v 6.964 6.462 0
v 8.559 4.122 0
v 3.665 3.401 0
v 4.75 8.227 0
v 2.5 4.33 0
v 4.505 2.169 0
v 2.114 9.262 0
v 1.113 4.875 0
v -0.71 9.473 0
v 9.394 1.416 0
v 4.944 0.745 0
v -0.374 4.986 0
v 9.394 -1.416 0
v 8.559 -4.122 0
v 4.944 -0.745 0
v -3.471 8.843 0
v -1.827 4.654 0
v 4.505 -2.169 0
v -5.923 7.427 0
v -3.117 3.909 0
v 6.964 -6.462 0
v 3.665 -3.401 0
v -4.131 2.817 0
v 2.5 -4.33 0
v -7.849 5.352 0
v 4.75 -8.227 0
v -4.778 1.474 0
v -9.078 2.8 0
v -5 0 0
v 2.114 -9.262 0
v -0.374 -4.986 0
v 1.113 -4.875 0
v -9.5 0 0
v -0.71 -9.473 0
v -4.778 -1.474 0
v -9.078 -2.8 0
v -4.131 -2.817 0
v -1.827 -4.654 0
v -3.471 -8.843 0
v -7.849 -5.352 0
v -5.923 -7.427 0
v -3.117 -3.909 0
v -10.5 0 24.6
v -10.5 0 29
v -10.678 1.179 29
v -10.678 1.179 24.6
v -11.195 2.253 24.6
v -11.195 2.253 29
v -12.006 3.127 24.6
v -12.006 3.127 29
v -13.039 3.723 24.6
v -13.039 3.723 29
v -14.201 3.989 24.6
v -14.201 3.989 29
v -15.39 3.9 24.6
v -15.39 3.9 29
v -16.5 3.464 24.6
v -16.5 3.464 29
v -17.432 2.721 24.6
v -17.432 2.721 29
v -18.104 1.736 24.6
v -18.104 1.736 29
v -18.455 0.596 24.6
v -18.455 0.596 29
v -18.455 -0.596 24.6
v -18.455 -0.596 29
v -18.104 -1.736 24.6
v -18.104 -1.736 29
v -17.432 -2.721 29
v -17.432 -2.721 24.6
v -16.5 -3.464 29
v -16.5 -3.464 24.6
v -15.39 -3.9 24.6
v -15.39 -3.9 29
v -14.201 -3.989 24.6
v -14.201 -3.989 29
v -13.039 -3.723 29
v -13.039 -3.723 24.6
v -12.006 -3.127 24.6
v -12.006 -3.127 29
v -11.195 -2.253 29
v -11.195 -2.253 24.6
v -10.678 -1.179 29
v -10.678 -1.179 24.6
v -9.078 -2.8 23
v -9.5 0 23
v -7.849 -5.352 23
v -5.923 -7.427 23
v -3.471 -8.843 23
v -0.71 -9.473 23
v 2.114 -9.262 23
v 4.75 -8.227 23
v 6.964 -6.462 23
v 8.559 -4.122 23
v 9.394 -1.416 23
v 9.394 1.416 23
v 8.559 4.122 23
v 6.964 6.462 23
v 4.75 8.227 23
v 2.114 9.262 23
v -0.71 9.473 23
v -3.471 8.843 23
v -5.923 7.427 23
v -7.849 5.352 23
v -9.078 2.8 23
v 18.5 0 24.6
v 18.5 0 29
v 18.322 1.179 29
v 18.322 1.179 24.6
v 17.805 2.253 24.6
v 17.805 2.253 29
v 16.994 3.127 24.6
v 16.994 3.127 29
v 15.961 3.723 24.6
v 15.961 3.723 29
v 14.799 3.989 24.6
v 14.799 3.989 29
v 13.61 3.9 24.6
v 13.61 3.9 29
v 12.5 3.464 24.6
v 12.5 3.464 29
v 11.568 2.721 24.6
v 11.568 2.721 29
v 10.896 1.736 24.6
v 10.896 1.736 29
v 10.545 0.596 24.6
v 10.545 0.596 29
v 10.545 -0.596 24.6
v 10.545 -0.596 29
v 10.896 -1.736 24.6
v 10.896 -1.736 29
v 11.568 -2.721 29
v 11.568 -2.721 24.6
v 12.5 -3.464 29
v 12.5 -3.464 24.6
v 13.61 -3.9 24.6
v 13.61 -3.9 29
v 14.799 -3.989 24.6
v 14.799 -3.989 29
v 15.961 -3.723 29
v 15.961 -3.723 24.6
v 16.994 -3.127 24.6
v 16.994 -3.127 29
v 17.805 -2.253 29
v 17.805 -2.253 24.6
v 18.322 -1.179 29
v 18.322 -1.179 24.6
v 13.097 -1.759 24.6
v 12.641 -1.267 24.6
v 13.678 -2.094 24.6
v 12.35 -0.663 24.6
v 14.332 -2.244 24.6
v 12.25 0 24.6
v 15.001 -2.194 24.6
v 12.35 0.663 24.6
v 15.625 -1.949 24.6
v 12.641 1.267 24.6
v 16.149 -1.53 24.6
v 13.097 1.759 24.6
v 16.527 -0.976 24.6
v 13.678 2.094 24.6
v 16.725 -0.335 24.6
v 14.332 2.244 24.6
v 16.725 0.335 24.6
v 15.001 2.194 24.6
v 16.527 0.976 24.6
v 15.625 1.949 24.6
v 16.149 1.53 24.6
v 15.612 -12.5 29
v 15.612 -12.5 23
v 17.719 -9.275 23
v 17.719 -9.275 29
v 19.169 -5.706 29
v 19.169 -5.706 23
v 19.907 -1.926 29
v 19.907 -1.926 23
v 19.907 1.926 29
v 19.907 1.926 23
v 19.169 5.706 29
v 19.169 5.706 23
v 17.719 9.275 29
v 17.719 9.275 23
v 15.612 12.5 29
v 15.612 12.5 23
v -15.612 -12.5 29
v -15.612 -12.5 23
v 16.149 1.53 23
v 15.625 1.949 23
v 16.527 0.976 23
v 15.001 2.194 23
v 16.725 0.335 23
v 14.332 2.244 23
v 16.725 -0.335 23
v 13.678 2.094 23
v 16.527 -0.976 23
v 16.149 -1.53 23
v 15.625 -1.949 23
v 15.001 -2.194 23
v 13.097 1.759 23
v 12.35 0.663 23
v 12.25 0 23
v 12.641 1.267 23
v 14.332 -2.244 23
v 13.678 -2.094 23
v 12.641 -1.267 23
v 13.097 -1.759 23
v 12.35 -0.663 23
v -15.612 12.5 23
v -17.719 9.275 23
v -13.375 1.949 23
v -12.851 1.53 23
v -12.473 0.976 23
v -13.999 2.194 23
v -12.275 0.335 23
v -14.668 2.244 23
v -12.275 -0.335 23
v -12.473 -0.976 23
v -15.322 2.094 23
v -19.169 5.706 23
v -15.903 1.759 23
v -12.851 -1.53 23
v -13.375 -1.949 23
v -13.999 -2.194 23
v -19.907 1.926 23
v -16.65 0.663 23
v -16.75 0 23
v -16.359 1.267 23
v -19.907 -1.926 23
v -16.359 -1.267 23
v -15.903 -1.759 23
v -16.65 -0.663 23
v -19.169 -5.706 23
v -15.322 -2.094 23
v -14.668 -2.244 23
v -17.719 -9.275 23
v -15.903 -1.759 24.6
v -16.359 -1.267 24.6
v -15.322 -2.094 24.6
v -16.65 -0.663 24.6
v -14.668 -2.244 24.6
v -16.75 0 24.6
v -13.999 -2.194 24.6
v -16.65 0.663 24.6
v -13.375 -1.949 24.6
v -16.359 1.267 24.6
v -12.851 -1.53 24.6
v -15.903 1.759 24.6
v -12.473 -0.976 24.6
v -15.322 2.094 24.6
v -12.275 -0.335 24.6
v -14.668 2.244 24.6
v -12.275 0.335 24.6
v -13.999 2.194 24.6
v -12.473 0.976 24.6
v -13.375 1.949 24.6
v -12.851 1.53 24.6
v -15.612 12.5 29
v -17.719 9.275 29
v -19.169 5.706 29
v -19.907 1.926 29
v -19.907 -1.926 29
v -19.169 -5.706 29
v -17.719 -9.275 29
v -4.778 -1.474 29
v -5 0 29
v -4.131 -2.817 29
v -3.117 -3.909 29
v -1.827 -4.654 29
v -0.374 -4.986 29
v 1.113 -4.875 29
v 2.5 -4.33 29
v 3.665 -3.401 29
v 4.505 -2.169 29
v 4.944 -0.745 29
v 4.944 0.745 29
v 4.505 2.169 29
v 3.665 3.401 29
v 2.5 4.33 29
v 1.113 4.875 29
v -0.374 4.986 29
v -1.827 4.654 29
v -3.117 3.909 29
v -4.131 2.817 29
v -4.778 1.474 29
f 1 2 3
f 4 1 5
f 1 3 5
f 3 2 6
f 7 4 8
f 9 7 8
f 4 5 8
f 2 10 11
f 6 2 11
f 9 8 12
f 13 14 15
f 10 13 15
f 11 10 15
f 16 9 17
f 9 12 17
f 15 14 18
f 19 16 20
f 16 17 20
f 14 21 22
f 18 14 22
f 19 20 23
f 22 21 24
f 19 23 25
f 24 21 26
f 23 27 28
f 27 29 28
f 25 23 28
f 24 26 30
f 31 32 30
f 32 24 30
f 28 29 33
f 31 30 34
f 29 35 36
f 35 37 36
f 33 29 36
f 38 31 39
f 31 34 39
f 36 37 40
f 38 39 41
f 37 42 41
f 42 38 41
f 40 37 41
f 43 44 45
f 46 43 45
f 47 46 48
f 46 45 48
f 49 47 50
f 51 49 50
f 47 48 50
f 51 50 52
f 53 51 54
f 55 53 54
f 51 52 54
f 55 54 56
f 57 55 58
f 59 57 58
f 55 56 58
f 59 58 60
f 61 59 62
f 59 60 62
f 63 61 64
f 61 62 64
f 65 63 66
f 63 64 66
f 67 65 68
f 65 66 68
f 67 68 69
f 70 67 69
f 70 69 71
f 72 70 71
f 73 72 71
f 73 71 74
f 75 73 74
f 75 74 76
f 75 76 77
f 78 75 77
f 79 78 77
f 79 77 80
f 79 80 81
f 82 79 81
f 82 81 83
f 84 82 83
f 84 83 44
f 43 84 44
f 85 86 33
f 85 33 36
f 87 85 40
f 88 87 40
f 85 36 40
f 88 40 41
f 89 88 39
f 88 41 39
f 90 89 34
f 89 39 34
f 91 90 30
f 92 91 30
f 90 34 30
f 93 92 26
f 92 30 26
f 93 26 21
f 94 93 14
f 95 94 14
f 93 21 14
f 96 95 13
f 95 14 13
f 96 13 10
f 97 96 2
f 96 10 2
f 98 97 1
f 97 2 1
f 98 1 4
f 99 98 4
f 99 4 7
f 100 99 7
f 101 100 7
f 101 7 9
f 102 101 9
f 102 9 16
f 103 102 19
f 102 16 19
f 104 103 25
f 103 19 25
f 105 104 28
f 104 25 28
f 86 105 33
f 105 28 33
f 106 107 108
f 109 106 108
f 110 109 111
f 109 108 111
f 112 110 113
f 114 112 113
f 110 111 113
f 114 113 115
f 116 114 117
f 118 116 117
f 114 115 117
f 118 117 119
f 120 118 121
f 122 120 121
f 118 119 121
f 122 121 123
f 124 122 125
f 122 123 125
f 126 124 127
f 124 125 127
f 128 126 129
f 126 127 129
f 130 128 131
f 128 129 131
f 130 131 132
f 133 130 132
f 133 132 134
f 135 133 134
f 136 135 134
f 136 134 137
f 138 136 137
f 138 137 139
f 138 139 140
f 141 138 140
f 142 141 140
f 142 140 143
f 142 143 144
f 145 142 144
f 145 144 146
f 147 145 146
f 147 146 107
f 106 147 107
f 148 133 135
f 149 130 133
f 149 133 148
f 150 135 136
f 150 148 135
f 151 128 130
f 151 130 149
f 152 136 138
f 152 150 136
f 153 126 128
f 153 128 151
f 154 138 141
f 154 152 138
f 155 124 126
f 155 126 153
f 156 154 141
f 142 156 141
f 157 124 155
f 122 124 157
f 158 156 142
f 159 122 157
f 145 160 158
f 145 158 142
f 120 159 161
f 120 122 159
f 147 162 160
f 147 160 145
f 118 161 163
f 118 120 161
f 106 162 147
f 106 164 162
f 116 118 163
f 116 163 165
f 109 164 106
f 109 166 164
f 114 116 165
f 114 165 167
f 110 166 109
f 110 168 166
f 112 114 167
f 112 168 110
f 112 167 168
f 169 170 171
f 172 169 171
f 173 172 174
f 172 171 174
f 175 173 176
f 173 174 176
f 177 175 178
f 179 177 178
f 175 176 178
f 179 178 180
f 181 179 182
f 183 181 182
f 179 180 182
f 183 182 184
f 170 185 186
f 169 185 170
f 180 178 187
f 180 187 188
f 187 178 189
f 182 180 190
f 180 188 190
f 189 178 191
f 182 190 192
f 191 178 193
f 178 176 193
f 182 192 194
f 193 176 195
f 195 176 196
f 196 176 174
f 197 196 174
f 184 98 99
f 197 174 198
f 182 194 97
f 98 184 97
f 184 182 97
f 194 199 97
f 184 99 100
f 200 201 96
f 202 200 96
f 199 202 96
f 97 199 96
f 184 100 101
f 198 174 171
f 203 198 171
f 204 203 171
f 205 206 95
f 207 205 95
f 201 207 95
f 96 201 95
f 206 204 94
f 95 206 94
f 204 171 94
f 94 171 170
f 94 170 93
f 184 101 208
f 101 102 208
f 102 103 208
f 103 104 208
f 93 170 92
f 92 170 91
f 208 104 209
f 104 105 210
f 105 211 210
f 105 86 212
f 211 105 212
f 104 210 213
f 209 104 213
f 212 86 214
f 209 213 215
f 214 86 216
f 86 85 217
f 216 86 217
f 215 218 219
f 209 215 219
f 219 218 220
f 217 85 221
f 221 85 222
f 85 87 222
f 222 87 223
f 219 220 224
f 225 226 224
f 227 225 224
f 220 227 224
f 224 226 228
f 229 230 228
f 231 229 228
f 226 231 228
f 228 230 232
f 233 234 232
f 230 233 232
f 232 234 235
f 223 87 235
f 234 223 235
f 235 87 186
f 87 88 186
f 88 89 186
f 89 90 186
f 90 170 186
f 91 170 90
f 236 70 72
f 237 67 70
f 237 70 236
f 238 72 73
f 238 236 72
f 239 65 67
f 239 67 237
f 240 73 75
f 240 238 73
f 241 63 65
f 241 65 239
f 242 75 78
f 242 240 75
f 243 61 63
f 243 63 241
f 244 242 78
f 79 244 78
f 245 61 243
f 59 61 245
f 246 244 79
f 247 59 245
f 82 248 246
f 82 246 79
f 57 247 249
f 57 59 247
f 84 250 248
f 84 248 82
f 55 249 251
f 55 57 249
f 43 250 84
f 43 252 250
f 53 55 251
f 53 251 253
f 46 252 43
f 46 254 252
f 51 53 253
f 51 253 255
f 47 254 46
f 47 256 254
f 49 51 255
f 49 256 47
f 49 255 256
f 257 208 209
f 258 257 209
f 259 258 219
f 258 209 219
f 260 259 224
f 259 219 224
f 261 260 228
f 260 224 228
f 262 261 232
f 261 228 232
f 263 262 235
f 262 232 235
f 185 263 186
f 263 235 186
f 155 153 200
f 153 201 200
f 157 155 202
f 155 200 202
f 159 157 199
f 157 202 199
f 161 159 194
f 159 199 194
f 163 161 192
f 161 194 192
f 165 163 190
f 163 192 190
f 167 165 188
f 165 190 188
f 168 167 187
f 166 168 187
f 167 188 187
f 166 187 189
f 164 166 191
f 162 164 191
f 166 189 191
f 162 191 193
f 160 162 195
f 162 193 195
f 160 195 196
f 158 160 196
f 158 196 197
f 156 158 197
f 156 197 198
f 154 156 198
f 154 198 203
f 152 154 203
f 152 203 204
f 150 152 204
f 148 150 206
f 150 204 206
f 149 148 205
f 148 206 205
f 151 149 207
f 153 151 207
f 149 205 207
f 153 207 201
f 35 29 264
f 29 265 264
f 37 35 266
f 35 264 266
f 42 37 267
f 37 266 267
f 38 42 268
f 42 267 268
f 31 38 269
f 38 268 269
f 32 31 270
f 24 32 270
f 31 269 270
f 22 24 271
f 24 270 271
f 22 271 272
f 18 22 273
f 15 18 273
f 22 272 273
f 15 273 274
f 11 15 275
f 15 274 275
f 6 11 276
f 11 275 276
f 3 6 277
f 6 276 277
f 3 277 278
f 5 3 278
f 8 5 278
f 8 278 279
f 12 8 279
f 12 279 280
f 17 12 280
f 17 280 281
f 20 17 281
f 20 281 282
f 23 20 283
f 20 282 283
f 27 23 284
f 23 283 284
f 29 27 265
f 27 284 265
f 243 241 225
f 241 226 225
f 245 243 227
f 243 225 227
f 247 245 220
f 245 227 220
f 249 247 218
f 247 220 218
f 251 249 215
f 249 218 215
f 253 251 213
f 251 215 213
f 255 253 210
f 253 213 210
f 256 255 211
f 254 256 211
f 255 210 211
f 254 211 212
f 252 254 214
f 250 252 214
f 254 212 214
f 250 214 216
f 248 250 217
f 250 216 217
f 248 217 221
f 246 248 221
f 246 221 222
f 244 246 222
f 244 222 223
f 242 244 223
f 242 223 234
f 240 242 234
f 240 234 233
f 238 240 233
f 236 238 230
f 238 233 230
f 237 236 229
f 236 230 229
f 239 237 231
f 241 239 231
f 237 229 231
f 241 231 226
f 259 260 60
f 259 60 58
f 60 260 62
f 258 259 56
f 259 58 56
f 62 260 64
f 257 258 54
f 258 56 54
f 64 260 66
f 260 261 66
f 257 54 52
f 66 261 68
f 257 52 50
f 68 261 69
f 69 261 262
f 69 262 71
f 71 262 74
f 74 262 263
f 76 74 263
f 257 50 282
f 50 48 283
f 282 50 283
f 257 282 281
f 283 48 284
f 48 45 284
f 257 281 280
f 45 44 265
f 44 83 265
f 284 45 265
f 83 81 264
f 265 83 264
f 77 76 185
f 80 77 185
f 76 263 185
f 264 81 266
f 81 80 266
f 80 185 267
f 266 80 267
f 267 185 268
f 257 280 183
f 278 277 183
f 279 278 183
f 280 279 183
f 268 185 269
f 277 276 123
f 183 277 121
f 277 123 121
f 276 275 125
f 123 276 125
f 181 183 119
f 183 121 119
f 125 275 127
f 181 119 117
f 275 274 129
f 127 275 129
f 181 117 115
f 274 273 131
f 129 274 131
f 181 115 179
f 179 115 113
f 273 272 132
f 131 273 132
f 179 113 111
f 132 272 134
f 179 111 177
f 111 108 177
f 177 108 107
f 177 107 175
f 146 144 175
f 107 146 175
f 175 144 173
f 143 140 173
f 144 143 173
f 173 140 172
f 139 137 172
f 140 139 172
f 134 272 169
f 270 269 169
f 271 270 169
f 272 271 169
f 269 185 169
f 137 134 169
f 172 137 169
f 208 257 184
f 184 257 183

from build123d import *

# Parameters (mm, degrees)
SKETCH_2_OUTSIDE_W        = 54.714
SKETCH_2_OUTSIDE_H        = 54.714
SKETCH_2_OUTSIDE_W_2      = 40
SKETCH_2_OUTSIDE_H_2      = 25
CUT_EXTRUDE_1_DEPTH       = 6
HOLE_WIZARD_1_D           = 4.5
HOLE_WIZARD_1_CBORE_D     = 8
HOLE_WIZARD_1_CBORE_DEPTH = 4.4


with BuildPart() as part:
    # 草图1 → 旋转1 (revolve)
    with BuildSketch(Plane(origin=(0, 0, 0), x_dir=(0, 0, 1), z_dir=(0, -1, 0))):
        Polygon((0, 5), (29, 5), (29, 20), (23, 20), (23, 9.5), (0, 9.5), align=None)
    revolve(axis=Axis((0, 0, 0), (0, 0, 1)))

    # 草图2 outside → 切除-拉伸1 (cut)
    with BuildSketch(Plane.XY.offset(29)):
        Rectangle(SKETCH_2_OUTSIDE_W, SKETCH_2_OUTSIDE_H)
        Rectangle(SKETCH_2_OUTSIDE_W_2, SKETCH_2_OUTSIDE_H_2, mode=Mode.SUBTRACT)
    extrude(amount=-CUT_EXTRUDE_1_DEPTH, mode=Mode.SUBTRACT)

    # 孔1 (through all)
    with Locations(Plane.XY.offset(29)):
        with Locations((-14.5, 0), (14.5, 0)):
            CounterBoreHole(HOLE_WIZARD_1_D / 2, HOLE_WIZARD_1_CBORE_D / 2, HOLE_WIZARD_1_CBORE_DEPTH)


solid = part.part
